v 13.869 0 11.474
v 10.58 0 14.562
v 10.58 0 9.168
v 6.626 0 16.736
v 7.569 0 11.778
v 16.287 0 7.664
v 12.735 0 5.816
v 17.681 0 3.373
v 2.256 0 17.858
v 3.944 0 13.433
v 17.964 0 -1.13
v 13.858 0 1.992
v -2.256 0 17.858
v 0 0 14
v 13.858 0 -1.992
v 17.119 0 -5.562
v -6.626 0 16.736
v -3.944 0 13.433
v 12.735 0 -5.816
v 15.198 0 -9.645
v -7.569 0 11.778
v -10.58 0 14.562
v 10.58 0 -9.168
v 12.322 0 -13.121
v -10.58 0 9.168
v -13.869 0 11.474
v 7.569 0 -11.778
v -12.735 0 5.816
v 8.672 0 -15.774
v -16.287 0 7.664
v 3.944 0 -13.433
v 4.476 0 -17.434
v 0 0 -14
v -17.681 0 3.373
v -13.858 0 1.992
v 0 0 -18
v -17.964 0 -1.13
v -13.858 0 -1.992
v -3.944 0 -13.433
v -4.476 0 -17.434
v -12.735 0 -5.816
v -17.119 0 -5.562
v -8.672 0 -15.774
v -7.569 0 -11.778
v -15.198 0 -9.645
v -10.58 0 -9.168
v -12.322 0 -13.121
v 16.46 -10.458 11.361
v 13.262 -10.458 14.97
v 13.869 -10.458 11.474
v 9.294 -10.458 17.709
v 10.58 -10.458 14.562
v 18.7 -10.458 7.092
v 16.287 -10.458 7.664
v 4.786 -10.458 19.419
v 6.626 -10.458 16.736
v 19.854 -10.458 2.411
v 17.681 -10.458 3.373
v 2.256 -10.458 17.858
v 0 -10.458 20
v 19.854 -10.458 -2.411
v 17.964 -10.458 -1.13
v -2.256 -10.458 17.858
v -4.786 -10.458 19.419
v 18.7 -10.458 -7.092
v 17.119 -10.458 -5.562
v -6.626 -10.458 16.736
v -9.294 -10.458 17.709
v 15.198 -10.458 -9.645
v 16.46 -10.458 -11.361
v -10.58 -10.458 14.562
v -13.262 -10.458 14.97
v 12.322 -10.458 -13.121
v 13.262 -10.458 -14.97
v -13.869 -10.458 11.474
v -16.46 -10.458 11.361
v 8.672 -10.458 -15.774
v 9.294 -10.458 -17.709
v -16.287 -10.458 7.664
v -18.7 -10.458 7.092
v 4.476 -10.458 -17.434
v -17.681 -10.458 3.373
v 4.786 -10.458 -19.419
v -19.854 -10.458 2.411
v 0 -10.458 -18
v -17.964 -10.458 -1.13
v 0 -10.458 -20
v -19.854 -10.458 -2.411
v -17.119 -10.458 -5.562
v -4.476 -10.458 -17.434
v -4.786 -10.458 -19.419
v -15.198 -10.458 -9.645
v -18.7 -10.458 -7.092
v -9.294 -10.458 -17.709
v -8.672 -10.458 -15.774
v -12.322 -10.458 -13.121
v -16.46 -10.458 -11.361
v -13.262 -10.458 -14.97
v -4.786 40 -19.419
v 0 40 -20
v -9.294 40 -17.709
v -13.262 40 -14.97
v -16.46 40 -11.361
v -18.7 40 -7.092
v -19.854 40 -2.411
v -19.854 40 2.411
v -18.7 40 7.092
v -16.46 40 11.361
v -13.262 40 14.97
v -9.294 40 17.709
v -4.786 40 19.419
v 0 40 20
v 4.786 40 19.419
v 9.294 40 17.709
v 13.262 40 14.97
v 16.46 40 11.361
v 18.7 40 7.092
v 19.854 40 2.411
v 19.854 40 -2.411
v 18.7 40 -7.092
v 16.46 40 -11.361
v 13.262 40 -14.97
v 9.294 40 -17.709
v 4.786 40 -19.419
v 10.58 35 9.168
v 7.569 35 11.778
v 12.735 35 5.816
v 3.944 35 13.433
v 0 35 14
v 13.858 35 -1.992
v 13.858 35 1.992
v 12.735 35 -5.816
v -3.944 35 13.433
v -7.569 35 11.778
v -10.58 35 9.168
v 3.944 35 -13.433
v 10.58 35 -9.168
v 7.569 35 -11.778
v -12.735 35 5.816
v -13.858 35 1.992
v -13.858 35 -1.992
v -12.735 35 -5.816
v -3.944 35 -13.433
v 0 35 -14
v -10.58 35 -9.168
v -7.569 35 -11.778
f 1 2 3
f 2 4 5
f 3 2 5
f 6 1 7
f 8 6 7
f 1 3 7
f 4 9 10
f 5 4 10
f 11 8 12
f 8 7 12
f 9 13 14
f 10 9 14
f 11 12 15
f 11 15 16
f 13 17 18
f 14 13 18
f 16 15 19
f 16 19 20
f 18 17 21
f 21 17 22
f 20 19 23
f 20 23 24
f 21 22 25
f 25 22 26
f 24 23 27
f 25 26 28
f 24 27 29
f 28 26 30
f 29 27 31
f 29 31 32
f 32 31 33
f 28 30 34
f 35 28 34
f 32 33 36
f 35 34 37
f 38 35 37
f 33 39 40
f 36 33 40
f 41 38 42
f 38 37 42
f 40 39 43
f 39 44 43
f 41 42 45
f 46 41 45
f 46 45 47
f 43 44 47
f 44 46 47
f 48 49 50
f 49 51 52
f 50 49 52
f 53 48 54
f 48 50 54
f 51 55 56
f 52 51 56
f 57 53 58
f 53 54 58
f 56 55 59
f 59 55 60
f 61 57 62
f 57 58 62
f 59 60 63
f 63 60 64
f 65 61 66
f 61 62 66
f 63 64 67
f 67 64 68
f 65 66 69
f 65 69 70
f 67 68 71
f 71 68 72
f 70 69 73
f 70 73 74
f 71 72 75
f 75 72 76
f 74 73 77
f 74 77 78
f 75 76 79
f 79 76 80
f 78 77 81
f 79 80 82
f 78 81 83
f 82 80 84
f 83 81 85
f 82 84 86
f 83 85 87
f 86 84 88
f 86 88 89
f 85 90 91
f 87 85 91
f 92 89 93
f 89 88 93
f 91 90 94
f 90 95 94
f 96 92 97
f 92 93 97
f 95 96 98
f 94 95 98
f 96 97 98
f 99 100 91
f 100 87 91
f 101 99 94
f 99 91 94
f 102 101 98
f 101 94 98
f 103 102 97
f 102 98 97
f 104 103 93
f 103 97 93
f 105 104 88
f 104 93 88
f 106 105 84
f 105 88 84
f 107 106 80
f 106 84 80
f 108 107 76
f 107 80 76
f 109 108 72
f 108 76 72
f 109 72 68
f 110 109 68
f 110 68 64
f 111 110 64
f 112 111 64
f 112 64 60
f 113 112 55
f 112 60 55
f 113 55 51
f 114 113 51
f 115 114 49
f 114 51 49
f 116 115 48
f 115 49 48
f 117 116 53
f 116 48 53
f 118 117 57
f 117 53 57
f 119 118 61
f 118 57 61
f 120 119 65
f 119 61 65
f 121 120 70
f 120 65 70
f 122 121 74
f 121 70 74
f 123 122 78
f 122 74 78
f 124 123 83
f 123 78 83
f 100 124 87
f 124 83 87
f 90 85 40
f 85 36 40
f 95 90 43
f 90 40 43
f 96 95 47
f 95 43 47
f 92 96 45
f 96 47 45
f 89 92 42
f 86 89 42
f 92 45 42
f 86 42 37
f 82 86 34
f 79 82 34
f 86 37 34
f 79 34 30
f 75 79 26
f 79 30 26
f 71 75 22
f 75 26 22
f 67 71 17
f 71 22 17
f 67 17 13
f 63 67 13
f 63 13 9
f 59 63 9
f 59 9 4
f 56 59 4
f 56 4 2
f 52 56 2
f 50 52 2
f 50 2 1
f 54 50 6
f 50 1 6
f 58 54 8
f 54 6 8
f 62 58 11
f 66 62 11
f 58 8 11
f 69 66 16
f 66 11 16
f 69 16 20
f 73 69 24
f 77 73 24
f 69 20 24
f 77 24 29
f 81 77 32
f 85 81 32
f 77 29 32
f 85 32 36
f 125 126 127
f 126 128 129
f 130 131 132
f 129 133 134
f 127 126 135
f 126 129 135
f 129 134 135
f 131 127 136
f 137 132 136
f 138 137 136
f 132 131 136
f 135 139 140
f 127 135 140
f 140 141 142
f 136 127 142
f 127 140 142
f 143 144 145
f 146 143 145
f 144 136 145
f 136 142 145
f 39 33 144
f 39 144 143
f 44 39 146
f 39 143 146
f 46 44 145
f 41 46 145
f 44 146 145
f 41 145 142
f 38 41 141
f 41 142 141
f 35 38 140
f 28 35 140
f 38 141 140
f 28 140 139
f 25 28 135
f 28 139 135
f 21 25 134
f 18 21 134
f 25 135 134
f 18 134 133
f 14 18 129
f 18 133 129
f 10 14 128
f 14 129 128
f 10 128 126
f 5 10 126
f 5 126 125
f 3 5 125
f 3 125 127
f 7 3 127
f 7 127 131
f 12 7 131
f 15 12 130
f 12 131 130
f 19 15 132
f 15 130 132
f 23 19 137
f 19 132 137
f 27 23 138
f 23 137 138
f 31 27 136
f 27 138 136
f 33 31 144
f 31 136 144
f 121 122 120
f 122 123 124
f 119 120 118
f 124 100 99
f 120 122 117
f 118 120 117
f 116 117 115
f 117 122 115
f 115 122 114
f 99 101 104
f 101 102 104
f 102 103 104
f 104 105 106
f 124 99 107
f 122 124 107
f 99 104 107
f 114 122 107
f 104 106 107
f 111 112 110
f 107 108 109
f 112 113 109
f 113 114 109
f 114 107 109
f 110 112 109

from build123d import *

# Parameters (mm, degrees)
SCHIZZO1_W = 2
SCHIZZO1_H = 10.457904347


with BuildPart() as part:
    # Schizzo1 → Rivoluzione1 (revolve)
    with BuildSketch(Plane.XY, mode=Mode.PRIVATE) as rivoluzione1_sk:
        Polygon((-20, 40), (-20, 0), (-14, 0), (-14, 35), (0, 35), (0, 40), align=None)
        with Locations((-19, -5.228952174)):
            Rectangle(SCHIZZO1_W, SCHIZZO1_H)
    revolve(rivoluzione1_sk.sketch.rotate(Axis((0, 0, 0), (0, 1, 0)), 270), axis=Axis((0, 0, 0), (0, 1, 0)))


solid = part.part
